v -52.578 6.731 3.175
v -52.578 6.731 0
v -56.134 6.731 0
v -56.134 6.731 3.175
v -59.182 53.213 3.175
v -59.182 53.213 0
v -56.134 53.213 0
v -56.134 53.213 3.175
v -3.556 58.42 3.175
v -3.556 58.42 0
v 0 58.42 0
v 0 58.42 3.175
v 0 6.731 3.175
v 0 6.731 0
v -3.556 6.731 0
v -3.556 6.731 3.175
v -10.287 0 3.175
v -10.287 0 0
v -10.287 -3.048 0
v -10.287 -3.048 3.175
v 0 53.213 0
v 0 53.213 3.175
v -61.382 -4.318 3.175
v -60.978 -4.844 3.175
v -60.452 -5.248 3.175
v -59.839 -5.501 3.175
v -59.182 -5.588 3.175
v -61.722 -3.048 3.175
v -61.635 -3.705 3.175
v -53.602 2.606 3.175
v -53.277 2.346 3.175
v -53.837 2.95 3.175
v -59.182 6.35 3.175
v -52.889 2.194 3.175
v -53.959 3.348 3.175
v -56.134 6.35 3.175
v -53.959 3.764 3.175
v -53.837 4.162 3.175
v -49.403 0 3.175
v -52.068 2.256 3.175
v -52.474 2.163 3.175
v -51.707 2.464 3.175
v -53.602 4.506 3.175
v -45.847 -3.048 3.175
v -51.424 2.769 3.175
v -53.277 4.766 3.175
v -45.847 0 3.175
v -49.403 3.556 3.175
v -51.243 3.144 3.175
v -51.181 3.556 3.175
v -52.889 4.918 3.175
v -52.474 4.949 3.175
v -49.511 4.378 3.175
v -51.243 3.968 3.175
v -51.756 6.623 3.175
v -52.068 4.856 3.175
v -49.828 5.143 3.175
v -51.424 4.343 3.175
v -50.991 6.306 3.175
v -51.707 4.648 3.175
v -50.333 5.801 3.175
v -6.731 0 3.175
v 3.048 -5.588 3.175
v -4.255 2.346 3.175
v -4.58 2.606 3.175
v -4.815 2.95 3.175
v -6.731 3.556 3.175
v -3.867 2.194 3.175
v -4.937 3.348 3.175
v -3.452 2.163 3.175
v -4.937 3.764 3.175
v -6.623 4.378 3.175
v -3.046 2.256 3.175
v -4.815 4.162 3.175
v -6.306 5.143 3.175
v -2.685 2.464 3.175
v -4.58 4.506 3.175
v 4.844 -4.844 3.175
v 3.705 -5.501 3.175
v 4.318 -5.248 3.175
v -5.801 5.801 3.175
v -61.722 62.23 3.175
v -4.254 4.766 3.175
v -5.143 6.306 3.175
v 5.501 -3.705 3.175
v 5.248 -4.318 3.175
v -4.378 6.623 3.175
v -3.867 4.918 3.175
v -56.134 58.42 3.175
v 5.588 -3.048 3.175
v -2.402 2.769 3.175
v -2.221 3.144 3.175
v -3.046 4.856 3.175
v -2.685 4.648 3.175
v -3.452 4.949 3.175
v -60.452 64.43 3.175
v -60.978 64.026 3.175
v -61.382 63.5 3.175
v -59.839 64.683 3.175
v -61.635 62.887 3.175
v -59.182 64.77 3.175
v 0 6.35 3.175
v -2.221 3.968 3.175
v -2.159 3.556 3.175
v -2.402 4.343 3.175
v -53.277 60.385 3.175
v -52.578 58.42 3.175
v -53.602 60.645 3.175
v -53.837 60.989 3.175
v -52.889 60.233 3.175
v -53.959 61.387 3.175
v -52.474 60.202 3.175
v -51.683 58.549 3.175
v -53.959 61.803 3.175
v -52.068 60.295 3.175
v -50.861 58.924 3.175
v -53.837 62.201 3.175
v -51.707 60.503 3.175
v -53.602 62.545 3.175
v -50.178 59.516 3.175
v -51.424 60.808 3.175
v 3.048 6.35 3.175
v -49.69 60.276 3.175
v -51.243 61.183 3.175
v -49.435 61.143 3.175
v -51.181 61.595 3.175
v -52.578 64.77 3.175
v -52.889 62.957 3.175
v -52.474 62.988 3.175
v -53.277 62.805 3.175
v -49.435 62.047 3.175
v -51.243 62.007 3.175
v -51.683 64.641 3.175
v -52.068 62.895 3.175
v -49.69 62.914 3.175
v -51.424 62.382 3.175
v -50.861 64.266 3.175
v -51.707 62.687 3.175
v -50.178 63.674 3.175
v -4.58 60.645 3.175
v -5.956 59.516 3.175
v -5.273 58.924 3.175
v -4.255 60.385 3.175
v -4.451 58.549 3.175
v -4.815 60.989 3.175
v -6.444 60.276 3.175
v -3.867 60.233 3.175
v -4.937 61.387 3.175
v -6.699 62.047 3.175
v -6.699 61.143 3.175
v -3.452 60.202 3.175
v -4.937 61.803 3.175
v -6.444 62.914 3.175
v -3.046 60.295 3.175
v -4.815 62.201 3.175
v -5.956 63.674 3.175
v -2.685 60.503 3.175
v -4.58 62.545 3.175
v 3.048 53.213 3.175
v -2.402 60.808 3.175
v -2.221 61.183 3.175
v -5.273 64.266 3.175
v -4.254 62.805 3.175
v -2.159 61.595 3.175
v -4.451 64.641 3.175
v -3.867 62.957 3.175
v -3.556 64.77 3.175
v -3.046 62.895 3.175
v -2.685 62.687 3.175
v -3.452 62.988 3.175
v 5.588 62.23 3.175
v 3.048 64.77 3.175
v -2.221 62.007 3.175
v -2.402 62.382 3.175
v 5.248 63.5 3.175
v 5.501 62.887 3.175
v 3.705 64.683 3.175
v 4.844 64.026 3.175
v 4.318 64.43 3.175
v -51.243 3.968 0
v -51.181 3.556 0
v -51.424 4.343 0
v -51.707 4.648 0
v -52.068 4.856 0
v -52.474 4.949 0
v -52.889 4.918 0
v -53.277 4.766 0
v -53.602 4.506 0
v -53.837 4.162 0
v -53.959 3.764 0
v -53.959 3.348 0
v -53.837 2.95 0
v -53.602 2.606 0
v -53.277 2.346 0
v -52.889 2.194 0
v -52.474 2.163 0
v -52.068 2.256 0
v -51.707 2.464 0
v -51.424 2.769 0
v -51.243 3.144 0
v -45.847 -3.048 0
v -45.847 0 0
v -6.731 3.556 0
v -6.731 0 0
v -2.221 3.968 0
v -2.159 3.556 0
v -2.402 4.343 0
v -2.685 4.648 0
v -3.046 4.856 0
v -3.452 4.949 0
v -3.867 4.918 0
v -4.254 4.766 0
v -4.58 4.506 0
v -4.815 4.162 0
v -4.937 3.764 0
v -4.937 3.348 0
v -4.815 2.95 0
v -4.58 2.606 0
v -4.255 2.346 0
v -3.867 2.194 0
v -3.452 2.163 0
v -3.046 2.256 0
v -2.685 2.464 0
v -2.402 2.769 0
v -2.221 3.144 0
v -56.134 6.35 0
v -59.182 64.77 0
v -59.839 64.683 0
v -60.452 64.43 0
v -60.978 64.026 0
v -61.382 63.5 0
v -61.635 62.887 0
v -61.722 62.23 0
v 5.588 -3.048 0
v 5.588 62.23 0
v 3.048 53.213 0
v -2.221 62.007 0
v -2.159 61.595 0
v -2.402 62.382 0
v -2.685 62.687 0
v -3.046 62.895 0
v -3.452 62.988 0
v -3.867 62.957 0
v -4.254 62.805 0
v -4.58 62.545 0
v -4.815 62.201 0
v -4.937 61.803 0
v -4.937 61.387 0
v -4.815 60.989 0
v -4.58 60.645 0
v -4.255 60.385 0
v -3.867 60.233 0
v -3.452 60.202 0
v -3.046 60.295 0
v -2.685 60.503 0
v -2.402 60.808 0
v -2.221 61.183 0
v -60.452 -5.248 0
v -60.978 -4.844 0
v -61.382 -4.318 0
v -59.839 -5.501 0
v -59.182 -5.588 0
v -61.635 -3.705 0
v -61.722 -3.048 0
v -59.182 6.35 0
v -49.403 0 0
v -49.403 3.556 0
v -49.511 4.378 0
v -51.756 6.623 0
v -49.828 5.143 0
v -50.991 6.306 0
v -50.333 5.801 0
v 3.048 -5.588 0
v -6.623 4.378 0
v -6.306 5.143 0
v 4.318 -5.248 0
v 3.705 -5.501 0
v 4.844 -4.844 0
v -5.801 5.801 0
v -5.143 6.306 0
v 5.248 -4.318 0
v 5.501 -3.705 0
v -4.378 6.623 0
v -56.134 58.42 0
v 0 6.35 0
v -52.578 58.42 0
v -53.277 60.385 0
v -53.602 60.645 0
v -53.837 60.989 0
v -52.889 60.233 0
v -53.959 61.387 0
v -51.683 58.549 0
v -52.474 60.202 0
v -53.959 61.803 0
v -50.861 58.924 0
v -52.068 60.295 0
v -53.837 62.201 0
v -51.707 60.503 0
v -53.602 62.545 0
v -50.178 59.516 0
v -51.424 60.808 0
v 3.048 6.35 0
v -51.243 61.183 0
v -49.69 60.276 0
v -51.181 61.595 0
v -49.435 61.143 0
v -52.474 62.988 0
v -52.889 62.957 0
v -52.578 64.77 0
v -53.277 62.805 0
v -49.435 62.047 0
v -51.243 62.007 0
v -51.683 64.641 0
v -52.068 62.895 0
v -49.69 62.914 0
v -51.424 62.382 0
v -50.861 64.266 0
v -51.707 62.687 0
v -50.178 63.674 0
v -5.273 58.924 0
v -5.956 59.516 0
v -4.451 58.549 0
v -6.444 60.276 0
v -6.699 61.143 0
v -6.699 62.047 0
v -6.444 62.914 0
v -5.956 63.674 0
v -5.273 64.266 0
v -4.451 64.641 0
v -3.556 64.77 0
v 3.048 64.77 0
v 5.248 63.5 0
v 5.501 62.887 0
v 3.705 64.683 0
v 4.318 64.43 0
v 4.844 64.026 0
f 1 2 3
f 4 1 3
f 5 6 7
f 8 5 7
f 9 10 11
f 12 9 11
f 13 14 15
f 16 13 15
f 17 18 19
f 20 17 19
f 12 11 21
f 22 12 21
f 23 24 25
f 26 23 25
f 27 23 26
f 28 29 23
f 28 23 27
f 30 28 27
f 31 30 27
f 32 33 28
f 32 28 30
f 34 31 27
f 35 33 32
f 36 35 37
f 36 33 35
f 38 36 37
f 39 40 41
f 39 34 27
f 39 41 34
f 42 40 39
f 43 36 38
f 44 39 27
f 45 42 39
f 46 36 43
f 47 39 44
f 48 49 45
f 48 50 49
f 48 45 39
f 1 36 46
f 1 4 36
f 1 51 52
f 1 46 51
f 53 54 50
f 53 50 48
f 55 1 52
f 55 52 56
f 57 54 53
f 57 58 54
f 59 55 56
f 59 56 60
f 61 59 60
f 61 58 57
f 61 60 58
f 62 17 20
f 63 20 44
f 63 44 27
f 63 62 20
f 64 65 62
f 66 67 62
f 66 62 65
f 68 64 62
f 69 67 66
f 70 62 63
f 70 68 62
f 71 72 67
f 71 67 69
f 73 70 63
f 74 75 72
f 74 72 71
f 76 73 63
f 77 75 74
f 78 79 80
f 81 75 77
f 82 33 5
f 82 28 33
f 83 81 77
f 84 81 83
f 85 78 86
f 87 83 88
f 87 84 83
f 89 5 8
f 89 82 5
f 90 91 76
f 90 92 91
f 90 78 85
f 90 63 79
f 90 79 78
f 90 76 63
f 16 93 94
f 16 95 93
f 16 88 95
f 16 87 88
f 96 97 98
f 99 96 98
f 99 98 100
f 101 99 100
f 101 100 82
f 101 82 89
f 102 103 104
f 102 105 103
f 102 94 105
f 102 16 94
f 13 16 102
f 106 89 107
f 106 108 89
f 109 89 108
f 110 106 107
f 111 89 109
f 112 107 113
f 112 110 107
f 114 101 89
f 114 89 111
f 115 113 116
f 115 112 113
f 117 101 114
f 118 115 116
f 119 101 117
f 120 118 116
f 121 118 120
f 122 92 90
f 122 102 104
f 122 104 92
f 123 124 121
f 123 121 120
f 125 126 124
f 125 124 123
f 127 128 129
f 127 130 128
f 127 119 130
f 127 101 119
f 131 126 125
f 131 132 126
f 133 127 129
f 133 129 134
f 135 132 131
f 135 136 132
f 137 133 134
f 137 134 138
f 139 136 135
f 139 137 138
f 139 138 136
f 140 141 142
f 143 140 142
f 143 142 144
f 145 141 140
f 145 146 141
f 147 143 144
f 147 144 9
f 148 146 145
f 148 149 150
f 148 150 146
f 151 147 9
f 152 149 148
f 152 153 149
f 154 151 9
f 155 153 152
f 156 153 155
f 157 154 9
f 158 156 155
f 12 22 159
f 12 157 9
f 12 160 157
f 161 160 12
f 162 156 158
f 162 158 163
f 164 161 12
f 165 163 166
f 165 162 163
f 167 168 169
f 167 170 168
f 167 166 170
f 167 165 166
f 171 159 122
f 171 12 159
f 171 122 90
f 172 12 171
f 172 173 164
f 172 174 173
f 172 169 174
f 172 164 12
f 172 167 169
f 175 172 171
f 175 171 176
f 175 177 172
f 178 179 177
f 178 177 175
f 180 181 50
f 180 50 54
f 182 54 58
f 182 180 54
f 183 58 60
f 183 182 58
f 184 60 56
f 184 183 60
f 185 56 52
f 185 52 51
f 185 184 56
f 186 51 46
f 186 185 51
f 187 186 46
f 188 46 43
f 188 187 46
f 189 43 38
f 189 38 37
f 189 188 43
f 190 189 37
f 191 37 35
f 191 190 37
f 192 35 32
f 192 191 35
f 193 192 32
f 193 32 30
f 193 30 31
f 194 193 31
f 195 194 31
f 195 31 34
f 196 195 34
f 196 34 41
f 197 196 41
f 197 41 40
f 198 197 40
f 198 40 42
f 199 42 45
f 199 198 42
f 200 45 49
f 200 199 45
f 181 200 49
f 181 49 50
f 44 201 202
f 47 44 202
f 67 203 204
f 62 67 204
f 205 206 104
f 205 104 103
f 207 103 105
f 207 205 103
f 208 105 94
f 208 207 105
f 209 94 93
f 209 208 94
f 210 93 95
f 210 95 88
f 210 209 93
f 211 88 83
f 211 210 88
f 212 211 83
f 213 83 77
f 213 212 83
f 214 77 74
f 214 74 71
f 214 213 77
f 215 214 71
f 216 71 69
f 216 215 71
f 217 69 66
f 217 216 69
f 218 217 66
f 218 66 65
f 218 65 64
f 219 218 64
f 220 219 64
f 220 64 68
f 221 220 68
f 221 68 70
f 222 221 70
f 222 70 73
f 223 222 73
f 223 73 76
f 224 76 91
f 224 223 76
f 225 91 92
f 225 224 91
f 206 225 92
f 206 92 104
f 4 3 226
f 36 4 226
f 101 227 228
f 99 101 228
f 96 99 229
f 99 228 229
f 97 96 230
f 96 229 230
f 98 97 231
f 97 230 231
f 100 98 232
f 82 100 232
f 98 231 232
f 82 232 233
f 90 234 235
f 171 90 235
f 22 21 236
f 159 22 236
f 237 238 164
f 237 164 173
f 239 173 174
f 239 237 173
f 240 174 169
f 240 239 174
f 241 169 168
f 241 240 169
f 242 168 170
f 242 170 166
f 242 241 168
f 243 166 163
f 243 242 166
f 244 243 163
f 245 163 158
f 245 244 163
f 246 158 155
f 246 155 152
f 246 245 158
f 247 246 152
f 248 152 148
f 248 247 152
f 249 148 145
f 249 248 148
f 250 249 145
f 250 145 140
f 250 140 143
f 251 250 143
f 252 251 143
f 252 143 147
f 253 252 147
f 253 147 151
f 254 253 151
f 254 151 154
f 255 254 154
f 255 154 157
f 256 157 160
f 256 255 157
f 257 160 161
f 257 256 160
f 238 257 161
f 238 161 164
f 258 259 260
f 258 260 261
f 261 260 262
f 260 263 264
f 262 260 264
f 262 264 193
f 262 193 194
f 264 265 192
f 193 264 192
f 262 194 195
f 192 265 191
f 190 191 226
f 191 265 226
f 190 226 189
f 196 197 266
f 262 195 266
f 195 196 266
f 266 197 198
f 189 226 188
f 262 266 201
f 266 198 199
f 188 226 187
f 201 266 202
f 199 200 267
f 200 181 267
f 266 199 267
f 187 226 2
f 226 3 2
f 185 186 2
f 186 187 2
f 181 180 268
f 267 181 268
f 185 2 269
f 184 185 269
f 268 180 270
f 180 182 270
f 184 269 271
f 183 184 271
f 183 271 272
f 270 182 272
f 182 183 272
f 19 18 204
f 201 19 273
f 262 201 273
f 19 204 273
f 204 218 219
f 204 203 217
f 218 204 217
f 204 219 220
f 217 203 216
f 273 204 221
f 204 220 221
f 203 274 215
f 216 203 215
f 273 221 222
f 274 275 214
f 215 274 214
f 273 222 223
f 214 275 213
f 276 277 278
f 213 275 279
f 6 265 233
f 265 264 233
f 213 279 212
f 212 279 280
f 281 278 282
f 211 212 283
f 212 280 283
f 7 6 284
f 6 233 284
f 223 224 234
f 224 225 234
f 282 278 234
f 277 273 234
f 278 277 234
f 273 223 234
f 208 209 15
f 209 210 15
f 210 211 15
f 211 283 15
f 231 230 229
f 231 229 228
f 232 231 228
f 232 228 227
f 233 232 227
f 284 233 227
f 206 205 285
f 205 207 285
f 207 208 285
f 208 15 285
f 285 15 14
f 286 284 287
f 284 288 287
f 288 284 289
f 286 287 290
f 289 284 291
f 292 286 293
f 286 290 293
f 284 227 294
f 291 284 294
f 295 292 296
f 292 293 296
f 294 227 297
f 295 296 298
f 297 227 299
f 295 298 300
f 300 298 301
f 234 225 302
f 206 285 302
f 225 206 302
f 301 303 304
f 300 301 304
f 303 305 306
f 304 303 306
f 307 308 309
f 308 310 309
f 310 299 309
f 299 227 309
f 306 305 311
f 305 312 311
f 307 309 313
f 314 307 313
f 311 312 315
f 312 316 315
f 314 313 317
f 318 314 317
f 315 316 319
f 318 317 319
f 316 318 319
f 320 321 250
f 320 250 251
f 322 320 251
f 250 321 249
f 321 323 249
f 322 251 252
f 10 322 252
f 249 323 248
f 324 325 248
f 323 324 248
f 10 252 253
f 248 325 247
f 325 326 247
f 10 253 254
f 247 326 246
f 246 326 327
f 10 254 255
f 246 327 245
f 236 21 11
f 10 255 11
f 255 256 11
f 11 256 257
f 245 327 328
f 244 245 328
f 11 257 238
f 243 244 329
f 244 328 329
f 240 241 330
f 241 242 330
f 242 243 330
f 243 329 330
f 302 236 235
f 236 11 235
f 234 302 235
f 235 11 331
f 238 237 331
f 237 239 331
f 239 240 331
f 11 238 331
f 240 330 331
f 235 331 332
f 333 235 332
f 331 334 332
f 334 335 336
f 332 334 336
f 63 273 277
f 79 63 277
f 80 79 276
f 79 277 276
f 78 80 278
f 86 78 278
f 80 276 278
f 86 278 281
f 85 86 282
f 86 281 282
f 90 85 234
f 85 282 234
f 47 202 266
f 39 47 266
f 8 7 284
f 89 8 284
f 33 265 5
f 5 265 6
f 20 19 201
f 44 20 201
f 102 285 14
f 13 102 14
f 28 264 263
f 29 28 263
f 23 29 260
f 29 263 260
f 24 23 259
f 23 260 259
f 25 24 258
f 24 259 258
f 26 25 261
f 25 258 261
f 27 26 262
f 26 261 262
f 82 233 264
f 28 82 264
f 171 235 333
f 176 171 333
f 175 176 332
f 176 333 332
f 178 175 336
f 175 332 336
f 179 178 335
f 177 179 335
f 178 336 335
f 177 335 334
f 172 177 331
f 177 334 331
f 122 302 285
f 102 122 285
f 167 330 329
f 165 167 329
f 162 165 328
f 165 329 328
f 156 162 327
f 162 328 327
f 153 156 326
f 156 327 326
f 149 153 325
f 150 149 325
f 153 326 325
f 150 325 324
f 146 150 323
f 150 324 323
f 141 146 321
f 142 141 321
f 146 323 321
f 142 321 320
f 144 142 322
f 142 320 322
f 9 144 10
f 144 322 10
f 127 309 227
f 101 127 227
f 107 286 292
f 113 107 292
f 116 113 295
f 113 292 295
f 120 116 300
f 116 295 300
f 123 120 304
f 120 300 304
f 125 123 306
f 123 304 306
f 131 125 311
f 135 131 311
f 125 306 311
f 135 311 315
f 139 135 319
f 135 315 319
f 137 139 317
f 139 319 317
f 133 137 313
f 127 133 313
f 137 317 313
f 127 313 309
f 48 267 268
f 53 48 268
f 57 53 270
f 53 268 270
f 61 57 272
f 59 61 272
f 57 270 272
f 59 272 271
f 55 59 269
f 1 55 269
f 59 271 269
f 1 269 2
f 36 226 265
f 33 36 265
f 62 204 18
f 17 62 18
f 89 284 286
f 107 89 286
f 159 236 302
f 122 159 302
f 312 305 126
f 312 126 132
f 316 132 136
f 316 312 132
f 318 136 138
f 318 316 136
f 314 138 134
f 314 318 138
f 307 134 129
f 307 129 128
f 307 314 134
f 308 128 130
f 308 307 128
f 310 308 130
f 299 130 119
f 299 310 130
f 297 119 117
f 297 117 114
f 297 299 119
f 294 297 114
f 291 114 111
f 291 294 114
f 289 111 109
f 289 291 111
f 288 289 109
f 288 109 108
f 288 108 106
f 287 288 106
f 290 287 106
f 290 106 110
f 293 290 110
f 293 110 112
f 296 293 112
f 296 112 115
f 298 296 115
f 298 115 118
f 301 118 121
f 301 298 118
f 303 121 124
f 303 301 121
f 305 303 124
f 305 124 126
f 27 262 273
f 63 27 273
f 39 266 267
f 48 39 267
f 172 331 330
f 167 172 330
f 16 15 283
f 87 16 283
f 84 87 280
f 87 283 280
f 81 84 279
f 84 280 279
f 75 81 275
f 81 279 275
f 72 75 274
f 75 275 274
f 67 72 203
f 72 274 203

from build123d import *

# Parameters (mm, degrees)
SKETCH1_R           = 3.175
SKETCH1_R_2         = 1.397
BOSS_EXTRUDE1_DEPTH = 3.175


with BuildPart() as part:
    # Sketch1 → Boss-Extrude1 (new body)
    with BuildSketch(Plane.XY):
        with BuildLine():
            Line((0, 58.42), (0, 53.213))
            Line((0, 53.213), (3.048, 53.213))
            Line((3.048, 53.213), (3.048, 6.35))
            Line((3.048, 6.35), (0, 6.35))
            Line((0, 6.35), (0, 6.731))
            Line((0, 6.731), (-3.556, 6.731))
            ThreePointArc((-3.556, 6.731), (-1.31093597, 5.80106403), (-0.381, 3.556))
            ThreePointArc((-0.381, 3.556), (-3.556, 0.381), (-6.731, 3.556))
            Line((-6.731, 3.556), (-6.731, 0))
            Line((-6.731, 0), (-10.287, 0))
            Line((-10.287, 0), (-10.287, -3.048))
            Line((-10.287, -3.048), (-45.847, -3.048))
            Line((-45.847, -3.048), (-45.847, 0))
            Line((-45.847, 0), (-49.403, 0))
            Line((-49.403, 0), (-49.403, 3.556))
            ThreePointArc((-49.403, 3.556), (-54.82306403, 1.31093597), (-52.578, 6.731))
            Line((-52.578, 6.731), (-56.134, 6.731))
            Line((-56.134, 6.731), (-56.134, 6.35))
            Line((-56.134, 6.35), (-59.182, 6.35))
            Line((-59.182, 6.35), (-59.182, 53.213))
            Line((-59.182, 53.213), (-56.134, 53.213))
            Line((-56.134, 53.213), (-56.134, 58.42))
            Line((-56.134, 58.42), (-52.578, 58.42))
            ThreePointArc((-52.578, 58.42), (-55.753, 61.595), (-52.578, 64.77))
            Line((-52.578, 64.77), (-59.182, 64.77))
            ThreePointArc((-59.182, 64.77), (-60.978051224, 64.026051224), (-61.722, 62.23))
            Line((-61.722, 62.23), (-61.722, -3.048))
            ThreePointArc((-61.722, -3.048), (-60.978051224, -4.844051224), (-59.182, -5.588))
            Line((-59.182, -5.588), (3.048, -5.588))
            ThreePointArc((3.048, -5.588), (4.844051224, -4.844051224), (5.588, -3.048))
            Line((5.588, -3.048), (5.588, 62.23))
            ThreePointArc((5.588, 62.23), (4.844051224, 64.026051224), (3.048, 64.77))
            Line((3.048, 64.77), (-3.556000021, 64.77))
            ThreePointArc((-3.556000021, 64.77), (-1.310935977, 63.840064038), (-0.381, 61.595))
            ThreePointArc((-0.381, 61.595), (-1.31093597, 59.34993597), (-3.556, 58.42))
            Line((-3.556, 58.42), (0, 58.42))
        make_face()
        with Locations((-52.578, 61.595)):
            Circle(SKETCH1_R)
        with Locations((-52.578, 61.595)):
            Circle(SKETCH1_R_2, mode=Mode.SUBTRACT)
        with Locations((-3.556, 61.595)):
            Circle(SKETCH1_R)
        with Locations((-3.556, 61.595)):
            Circle(SKETCH1_R_2, mode=Mode.SUBTRACT)
        with Locations((-52.578, 3.556)):
            Circle(SKETCH1_R)
        with Locations((-52.578, 3.556)):
            Circle(SKETCH1_R_2, mode=Mode.SUBTRACT)
        with Locations((-3.556, 3.556)):
            Circle(SKETCH1_R)
        with Locations((-3.556, 3.556)):
            Circle(SKETCH1_R_2, mode=Mode.SUBTRACT)
    extrude(amount=BOSS_EXTRUDE1_DEPTH)


solid = part.part
